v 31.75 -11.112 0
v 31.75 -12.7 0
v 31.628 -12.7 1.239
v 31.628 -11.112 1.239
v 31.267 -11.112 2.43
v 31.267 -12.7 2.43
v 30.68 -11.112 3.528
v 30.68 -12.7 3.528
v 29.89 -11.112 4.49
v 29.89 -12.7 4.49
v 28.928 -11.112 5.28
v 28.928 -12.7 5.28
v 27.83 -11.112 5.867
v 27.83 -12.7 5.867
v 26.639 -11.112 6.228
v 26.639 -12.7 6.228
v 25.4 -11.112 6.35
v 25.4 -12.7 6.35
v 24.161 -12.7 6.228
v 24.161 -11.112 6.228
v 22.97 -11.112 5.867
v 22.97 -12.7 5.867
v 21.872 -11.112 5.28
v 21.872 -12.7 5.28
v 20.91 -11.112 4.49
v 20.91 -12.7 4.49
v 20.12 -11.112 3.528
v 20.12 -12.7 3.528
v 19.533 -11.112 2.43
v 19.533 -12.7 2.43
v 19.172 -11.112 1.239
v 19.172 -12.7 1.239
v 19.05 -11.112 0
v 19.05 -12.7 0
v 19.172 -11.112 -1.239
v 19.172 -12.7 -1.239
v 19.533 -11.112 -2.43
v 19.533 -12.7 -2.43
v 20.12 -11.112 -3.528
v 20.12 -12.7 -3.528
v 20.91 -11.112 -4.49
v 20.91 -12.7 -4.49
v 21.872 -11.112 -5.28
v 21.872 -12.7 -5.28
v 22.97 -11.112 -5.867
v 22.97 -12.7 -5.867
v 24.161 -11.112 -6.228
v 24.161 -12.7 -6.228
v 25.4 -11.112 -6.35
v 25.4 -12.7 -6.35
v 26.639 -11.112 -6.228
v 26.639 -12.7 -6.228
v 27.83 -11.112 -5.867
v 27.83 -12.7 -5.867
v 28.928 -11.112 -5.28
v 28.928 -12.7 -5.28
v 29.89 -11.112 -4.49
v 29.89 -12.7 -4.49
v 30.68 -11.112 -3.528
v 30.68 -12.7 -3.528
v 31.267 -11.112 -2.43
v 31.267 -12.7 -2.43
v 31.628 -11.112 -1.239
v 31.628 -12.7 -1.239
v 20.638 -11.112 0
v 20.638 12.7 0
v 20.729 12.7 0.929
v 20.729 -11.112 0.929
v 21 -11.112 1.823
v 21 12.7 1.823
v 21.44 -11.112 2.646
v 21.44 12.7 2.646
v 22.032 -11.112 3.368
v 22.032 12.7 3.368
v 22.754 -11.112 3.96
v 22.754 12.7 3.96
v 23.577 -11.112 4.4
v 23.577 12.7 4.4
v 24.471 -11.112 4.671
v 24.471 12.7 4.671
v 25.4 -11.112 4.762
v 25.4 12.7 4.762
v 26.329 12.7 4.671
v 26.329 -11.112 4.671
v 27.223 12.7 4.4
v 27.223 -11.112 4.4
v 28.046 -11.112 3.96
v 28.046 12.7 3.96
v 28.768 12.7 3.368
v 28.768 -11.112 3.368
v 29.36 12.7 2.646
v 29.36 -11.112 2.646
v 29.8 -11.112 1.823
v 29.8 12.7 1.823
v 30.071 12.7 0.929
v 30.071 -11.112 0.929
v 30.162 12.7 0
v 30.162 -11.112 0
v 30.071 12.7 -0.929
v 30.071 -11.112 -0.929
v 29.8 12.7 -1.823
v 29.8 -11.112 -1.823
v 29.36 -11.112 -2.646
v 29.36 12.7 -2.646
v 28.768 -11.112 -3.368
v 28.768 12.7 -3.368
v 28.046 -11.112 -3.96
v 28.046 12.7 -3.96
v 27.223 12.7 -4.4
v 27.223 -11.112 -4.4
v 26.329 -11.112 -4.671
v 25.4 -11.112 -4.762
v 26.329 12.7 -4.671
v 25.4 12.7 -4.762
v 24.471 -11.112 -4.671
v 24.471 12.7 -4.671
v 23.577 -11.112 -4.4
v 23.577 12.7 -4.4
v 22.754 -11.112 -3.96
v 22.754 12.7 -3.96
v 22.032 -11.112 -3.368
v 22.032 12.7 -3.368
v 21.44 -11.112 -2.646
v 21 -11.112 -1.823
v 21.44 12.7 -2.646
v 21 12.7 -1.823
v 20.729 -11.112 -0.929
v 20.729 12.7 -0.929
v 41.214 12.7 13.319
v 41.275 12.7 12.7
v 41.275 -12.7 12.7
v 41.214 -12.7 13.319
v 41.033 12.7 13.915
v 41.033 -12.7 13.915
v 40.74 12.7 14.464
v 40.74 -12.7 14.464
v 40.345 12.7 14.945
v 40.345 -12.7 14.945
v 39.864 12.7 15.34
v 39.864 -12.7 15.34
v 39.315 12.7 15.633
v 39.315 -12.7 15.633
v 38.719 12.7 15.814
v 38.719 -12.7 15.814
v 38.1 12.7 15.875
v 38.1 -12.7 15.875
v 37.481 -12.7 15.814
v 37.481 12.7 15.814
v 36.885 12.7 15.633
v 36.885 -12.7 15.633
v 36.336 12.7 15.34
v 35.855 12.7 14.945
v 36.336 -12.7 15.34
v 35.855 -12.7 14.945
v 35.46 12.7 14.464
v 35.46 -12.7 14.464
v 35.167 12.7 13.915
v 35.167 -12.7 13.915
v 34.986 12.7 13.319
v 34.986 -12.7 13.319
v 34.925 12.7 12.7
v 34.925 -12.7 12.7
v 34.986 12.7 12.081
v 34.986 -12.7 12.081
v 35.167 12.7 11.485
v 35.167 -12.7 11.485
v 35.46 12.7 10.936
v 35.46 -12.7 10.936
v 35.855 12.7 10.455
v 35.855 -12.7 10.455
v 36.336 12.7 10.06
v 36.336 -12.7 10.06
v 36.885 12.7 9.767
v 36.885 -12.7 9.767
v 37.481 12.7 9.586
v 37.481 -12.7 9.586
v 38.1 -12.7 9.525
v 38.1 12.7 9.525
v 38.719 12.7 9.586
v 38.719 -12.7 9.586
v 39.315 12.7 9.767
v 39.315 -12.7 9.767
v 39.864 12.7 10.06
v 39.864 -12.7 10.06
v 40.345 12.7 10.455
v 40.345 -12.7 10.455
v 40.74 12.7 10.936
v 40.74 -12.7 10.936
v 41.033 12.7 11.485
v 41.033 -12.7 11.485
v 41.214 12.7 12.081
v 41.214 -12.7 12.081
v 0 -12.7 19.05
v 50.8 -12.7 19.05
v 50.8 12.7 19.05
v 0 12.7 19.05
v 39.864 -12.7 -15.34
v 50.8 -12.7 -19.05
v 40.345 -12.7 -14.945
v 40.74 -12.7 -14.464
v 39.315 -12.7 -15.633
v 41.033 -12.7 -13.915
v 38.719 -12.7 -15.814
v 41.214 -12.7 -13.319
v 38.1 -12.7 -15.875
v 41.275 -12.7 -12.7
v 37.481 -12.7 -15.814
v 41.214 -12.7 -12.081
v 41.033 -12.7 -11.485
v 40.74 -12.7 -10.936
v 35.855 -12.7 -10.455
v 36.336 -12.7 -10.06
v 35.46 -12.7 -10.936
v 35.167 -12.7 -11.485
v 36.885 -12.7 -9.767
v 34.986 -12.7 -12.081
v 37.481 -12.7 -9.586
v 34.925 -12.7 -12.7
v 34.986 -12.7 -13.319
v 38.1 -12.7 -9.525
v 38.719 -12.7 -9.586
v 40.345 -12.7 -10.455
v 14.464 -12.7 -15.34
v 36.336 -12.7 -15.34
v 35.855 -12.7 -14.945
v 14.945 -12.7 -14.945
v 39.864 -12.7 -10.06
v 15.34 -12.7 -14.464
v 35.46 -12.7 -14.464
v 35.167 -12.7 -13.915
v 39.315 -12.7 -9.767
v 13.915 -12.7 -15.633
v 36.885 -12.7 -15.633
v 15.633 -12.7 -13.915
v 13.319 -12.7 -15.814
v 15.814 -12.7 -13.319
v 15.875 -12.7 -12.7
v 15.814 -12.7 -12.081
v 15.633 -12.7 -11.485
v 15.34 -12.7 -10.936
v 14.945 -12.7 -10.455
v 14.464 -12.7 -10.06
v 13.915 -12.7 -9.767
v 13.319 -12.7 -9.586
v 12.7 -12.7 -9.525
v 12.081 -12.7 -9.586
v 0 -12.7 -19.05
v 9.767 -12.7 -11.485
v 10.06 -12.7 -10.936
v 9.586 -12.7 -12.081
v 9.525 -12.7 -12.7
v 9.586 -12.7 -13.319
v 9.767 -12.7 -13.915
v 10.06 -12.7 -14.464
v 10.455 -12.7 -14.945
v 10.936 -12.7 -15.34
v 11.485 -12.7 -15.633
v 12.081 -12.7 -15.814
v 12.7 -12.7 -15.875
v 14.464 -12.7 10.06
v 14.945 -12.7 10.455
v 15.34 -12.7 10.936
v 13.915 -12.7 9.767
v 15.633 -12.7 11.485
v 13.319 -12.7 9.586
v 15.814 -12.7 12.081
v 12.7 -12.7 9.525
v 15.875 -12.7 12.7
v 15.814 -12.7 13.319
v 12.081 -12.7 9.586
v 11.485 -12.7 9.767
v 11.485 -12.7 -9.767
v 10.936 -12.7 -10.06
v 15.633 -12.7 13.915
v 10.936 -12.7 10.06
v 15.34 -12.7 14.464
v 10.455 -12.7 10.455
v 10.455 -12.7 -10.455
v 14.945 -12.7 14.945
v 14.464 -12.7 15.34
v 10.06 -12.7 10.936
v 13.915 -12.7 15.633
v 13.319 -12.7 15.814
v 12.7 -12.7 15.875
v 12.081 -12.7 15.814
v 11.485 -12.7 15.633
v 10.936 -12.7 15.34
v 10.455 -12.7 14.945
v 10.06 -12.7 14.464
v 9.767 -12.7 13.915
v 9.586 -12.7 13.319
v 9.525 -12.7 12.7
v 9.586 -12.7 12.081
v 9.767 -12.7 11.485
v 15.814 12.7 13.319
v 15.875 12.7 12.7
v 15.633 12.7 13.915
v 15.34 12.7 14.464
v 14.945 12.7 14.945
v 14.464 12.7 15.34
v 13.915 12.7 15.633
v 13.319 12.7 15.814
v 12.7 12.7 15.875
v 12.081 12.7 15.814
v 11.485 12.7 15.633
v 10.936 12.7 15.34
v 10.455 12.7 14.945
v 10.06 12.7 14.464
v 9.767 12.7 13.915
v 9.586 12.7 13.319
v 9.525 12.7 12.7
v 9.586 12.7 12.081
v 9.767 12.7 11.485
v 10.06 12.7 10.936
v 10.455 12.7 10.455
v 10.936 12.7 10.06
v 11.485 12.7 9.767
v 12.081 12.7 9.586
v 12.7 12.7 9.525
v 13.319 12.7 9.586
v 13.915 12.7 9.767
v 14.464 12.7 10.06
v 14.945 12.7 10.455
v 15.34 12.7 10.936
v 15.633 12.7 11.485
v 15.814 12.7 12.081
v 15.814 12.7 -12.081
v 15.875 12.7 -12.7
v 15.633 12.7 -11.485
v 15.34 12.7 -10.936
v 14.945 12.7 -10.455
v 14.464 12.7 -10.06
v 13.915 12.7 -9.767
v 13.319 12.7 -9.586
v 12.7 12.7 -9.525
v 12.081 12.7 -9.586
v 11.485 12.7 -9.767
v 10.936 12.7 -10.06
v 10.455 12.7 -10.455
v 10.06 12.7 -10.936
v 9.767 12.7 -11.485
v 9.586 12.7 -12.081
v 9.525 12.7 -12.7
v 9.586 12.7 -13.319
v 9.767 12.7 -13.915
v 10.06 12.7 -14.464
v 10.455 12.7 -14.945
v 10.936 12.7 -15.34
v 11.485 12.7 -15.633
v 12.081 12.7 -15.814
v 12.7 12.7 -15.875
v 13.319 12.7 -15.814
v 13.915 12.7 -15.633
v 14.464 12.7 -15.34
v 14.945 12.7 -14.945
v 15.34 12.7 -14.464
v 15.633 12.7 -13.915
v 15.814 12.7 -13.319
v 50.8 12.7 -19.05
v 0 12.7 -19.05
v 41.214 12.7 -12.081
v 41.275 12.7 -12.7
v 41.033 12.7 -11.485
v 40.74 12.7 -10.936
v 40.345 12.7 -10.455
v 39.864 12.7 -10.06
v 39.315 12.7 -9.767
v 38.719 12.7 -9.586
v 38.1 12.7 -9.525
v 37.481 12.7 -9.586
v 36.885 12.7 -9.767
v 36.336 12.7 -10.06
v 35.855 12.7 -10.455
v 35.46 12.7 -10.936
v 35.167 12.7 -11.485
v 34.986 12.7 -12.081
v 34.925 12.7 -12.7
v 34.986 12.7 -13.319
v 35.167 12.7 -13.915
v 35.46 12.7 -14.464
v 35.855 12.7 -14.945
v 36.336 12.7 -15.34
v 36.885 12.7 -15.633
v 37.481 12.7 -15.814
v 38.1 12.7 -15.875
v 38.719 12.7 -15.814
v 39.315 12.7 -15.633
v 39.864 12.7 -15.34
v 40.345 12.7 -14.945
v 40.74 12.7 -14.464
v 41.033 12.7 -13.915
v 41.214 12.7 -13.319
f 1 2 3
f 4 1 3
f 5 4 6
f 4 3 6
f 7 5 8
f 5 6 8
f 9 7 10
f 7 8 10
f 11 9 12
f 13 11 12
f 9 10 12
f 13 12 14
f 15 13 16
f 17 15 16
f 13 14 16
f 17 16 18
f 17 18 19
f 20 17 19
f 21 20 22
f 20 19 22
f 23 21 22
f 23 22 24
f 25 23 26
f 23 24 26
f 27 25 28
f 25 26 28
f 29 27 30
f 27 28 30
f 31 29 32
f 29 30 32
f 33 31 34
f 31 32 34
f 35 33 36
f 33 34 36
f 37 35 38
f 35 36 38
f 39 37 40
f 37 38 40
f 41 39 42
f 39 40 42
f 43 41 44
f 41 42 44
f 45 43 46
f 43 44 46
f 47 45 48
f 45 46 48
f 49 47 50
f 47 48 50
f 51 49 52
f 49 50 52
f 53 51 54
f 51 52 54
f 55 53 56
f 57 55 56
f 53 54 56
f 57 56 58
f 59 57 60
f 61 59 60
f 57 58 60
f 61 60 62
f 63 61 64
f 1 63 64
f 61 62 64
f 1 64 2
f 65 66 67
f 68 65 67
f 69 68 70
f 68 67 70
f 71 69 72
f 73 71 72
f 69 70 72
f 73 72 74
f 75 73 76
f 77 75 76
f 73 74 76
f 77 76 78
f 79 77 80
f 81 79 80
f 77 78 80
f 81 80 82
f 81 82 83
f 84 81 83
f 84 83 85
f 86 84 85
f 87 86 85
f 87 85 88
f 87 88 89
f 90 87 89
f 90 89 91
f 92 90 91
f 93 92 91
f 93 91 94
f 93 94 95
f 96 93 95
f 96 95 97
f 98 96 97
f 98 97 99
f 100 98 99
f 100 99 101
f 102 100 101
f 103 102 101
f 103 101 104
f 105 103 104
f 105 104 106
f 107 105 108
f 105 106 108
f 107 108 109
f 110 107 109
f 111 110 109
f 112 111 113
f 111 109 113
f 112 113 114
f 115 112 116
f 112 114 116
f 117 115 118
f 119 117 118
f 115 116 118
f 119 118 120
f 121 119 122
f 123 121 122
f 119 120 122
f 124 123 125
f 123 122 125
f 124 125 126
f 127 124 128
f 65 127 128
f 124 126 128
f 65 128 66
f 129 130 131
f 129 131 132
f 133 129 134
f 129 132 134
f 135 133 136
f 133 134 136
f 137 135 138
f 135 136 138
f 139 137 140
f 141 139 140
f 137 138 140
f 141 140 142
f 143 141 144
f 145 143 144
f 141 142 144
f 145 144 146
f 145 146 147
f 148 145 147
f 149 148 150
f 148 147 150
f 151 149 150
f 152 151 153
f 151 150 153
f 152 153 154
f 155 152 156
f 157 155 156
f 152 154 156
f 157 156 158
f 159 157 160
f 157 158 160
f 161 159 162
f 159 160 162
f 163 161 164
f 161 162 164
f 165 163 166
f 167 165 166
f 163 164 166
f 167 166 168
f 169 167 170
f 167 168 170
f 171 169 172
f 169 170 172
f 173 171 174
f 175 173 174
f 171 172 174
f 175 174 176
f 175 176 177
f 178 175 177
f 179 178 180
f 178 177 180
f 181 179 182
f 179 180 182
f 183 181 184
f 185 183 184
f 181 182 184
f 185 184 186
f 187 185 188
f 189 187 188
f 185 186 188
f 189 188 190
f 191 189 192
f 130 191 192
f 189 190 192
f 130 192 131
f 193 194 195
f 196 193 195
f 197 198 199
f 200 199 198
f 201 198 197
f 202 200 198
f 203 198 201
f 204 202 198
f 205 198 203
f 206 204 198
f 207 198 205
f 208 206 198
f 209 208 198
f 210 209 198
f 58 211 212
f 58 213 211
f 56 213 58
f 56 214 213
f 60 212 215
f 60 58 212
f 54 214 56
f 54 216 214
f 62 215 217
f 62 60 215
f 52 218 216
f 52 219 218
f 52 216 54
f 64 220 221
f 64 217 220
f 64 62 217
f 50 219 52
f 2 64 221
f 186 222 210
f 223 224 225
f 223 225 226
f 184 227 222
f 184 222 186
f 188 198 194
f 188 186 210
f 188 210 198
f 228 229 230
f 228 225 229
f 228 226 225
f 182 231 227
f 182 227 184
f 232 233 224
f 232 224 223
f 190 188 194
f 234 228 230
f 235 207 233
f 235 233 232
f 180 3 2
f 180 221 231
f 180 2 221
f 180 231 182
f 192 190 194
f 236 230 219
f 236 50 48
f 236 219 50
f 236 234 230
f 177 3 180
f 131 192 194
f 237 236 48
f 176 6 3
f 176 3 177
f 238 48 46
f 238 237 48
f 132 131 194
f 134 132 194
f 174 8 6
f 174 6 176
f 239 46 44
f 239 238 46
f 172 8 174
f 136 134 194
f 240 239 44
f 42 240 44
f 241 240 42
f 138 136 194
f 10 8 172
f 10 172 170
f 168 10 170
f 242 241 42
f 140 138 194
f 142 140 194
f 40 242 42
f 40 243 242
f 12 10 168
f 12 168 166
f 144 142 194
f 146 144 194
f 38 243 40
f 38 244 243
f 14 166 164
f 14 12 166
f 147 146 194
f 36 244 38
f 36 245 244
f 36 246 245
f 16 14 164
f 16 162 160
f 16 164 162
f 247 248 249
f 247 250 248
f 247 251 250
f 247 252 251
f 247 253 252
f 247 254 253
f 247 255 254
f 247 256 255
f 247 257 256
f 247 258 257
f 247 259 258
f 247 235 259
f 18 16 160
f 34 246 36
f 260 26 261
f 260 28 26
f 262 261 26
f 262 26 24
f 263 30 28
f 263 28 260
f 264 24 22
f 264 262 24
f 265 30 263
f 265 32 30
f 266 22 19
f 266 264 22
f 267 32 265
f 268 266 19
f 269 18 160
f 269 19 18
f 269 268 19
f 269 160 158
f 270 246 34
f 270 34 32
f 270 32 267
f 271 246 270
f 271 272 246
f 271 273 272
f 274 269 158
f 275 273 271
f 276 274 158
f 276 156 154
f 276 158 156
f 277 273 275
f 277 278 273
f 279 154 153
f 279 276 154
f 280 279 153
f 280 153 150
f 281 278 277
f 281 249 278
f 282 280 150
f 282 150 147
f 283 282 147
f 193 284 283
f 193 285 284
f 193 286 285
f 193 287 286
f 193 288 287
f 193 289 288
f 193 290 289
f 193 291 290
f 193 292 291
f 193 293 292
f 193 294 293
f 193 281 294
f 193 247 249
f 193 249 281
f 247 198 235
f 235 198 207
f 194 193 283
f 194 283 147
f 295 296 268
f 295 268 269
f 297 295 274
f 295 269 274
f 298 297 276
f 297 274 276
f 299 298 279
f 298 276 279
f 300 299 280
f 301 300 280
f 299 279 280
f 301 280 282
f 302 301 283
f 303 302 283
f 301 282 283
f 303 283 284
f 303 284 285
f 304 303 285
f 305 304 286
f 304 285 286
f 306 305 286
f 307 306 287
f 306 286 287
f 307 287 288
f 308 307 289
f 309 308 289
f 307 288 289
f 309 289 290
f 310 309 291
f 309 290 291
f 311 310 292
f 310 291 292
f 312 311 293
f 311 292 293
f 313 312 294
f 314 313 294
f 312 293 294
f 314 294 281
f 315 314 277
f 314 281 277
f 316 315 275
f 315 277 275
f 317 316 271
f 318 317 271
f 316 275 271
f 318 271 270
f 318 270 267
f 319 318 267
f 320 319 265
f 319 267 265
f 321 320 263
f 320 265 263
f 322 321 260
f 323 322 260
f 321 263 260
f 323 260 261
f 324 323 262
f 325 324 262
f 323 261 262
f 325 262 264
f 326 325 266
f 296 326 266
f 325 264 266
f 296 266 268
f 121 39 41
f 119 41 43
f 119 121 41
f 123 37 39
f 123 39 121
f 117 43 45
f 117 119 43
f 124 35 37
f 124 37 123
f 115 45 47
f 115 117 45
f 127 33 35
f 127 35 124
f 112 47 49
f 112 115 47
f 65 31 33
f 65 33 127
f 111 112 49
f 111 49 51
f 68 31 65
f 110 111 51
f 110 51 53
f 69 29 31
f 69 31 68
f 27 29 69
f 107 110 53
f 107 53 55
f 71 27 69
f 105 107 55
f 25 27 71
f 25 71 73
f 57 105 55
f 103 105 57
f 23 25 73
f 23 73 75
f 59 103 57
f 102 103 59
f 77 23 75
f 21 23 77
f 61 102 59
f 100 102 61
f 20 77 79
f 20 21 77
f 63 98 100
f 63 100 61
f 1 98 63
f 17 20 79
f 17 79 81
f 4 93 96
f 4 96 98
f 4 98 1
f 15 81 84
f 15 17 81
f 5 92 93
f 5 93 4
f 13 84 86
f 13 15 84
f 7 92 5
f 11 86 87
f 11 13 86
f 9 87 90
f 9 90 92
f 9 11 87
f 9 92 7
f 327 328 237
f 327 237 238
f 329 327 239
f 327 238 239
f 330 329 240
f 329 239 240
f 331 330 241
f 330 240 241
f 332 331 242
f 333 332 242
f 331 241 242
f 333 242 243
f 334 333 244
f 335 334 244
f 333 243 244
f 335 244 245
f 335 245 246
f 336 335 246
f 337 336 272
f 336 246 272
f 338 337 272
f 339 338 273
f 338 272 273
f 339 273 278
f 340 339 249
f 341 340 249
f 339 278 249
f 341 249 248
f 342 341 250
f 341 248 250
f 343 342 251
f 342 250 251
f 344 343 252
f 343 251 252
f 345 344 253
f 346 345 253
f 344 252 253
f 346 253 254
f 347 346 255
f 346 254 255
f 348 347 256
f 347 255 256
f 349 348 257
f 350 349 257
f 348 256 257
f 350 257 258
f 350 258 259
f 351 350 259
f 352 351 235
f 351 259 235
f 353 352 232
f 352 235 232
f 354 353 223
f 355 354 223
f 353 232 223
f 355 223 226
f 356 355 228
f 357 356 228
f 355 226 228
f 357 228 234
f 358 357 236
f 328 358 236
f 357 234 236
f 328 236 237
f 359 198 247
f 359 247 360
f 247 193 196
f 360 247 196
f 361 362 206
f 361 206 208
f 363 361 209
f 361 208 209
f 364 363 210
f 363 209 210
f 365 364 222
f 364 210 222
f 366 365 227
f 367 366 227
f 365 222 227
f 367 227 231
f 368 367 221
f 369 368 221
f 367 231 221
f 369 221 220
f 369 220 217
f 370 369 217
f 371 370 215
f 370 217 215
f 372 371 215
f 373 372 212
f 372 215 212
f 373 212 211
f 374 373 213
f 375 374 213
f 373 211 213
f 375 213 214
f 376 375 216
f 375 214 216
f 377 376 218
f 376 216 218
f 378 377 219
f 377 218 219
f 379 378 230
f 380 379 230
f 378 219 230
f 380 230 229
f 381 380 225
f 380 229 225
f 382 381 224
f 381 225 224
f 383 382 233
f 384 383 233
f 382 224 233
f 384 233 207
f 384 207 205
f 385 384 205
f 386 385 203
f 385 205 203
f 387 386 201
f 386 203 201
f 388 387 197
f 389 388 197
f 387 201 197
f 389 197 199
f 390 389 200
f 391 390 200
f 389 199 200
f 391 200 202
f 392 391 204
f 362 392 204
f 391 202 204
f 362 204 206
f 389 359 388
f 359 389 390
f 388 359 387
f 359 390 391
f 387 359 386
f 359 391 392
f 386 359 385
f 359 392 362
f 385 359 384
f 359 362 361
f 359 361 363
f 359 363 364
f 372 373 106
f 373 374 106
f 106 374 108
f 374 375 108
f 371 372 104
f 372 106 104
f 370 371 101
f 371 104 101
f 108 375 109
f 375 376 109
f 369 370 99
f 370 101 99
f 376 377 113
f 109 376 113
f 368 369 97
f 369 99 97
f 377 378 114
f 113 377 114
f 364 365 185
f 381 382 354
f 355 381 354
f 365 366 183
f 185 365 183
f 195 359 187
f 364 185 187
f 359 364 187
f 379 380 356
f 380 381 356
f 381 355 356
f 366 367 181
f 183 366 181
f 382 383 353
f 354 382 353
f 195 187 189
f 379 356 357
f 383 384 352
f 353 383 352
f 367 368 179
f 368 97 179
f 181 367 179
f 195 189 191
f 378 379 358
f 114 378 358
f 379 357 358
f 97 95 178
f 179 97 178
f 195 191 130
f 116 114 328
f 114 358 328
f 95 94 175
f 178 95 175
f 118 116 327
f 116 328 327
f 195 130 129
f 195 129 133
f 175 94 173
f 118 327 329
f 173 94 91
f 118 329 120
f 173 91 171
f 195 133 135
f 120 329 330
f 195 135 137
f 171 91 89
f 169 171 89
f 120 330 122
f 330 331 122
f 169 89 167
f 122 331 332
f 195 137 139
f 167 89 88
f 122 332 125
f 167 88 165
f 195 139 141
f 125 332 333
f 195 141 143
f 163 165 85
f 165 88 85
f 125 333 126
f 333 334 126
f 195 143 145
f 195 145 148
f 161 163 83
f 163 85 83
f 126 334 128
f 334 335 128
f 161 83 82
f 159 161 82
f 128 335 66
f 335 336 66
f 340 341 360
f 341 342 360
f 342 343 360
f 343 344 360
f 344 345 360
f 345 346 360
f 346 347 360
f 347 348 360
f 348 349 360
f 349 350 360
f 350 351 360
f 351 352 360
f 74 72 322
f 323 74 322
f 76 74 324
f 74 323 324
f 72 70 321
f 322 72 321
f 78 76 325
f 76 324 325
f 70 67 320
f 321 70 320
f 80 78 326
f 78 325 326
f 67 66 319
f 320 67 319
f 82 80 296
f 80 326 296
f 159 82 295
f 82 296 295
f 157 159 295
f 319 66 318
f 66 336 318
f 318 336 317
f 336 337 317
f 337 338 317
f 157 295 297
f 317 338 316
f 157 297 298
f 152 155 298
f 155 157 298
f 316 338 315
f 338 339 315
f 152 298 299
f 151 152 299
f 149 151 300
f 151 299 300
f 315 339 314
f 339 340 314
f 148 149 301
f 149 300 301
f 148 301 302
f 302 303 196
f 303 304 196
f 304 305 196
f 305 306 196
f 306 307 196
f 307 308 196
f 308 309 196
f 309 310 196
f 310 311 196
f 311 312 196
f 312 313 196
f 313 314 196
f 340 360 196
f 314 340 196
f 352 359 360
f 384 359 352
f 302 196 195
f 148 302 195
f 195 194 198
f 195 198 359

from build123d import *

# Parameters (mm, degrees)
F0_W     = 25.4
F0_H     = 38.1
F1_DEPTH = 50.8
F2_R     = 3.175
F3_DEPTH = 25.4
F4_R     = 6.35
F5_DEPTH = 1.5875
F6_R     = 4.7625
F7_DEPTH = 25.4


with BuildPart() as f1:
    # F0 (on Right) → F1 (new body)
    with BuildSketch(Plane.YZ):
        Rectangle(F0_W, F0_H)
    extrude(amount=F1_DEPTH)

    # F2 (on face) → F3 (cut)
    with BuildSketch(Plane.XZ.offset(12.7)):
        with Locations((12.7, 12.7)):
            Circle(F2_R)
        with Locations((38.1, -12.7)):
            Circle(F2_R)
        with Locations((38.1, 12.7)):
            Circle(F2_R)
        with Locations((12.7, -12.7)):
            Circle(F2_R)
    extrude(amount=-F3_DEPTH, mode=Mode.SUBTRACT)

    # F4 (on face) → F5 (cut)
    with BuildSketch(Plane.XZ.offset(12.7)):
        with Locations((25.4, 0)):
            Circle(F4_R)
    extrude(amount=-F5_DEPTH, mode=Mode.SUBTRACT)

    # F6 (on face) → F7 (cut)
    with BuildSketch(Plane(origin=(0, 12.7, 0), x_dir=(-1, 0, 0), z_dir=(0, 1, 0))):
        with Locations((-25.4, 0)):
            Circle(F6_R)
    extrude(amount=-F7_DEPTH, mode=Mode.SUBTRACT)


solid = f1.part
